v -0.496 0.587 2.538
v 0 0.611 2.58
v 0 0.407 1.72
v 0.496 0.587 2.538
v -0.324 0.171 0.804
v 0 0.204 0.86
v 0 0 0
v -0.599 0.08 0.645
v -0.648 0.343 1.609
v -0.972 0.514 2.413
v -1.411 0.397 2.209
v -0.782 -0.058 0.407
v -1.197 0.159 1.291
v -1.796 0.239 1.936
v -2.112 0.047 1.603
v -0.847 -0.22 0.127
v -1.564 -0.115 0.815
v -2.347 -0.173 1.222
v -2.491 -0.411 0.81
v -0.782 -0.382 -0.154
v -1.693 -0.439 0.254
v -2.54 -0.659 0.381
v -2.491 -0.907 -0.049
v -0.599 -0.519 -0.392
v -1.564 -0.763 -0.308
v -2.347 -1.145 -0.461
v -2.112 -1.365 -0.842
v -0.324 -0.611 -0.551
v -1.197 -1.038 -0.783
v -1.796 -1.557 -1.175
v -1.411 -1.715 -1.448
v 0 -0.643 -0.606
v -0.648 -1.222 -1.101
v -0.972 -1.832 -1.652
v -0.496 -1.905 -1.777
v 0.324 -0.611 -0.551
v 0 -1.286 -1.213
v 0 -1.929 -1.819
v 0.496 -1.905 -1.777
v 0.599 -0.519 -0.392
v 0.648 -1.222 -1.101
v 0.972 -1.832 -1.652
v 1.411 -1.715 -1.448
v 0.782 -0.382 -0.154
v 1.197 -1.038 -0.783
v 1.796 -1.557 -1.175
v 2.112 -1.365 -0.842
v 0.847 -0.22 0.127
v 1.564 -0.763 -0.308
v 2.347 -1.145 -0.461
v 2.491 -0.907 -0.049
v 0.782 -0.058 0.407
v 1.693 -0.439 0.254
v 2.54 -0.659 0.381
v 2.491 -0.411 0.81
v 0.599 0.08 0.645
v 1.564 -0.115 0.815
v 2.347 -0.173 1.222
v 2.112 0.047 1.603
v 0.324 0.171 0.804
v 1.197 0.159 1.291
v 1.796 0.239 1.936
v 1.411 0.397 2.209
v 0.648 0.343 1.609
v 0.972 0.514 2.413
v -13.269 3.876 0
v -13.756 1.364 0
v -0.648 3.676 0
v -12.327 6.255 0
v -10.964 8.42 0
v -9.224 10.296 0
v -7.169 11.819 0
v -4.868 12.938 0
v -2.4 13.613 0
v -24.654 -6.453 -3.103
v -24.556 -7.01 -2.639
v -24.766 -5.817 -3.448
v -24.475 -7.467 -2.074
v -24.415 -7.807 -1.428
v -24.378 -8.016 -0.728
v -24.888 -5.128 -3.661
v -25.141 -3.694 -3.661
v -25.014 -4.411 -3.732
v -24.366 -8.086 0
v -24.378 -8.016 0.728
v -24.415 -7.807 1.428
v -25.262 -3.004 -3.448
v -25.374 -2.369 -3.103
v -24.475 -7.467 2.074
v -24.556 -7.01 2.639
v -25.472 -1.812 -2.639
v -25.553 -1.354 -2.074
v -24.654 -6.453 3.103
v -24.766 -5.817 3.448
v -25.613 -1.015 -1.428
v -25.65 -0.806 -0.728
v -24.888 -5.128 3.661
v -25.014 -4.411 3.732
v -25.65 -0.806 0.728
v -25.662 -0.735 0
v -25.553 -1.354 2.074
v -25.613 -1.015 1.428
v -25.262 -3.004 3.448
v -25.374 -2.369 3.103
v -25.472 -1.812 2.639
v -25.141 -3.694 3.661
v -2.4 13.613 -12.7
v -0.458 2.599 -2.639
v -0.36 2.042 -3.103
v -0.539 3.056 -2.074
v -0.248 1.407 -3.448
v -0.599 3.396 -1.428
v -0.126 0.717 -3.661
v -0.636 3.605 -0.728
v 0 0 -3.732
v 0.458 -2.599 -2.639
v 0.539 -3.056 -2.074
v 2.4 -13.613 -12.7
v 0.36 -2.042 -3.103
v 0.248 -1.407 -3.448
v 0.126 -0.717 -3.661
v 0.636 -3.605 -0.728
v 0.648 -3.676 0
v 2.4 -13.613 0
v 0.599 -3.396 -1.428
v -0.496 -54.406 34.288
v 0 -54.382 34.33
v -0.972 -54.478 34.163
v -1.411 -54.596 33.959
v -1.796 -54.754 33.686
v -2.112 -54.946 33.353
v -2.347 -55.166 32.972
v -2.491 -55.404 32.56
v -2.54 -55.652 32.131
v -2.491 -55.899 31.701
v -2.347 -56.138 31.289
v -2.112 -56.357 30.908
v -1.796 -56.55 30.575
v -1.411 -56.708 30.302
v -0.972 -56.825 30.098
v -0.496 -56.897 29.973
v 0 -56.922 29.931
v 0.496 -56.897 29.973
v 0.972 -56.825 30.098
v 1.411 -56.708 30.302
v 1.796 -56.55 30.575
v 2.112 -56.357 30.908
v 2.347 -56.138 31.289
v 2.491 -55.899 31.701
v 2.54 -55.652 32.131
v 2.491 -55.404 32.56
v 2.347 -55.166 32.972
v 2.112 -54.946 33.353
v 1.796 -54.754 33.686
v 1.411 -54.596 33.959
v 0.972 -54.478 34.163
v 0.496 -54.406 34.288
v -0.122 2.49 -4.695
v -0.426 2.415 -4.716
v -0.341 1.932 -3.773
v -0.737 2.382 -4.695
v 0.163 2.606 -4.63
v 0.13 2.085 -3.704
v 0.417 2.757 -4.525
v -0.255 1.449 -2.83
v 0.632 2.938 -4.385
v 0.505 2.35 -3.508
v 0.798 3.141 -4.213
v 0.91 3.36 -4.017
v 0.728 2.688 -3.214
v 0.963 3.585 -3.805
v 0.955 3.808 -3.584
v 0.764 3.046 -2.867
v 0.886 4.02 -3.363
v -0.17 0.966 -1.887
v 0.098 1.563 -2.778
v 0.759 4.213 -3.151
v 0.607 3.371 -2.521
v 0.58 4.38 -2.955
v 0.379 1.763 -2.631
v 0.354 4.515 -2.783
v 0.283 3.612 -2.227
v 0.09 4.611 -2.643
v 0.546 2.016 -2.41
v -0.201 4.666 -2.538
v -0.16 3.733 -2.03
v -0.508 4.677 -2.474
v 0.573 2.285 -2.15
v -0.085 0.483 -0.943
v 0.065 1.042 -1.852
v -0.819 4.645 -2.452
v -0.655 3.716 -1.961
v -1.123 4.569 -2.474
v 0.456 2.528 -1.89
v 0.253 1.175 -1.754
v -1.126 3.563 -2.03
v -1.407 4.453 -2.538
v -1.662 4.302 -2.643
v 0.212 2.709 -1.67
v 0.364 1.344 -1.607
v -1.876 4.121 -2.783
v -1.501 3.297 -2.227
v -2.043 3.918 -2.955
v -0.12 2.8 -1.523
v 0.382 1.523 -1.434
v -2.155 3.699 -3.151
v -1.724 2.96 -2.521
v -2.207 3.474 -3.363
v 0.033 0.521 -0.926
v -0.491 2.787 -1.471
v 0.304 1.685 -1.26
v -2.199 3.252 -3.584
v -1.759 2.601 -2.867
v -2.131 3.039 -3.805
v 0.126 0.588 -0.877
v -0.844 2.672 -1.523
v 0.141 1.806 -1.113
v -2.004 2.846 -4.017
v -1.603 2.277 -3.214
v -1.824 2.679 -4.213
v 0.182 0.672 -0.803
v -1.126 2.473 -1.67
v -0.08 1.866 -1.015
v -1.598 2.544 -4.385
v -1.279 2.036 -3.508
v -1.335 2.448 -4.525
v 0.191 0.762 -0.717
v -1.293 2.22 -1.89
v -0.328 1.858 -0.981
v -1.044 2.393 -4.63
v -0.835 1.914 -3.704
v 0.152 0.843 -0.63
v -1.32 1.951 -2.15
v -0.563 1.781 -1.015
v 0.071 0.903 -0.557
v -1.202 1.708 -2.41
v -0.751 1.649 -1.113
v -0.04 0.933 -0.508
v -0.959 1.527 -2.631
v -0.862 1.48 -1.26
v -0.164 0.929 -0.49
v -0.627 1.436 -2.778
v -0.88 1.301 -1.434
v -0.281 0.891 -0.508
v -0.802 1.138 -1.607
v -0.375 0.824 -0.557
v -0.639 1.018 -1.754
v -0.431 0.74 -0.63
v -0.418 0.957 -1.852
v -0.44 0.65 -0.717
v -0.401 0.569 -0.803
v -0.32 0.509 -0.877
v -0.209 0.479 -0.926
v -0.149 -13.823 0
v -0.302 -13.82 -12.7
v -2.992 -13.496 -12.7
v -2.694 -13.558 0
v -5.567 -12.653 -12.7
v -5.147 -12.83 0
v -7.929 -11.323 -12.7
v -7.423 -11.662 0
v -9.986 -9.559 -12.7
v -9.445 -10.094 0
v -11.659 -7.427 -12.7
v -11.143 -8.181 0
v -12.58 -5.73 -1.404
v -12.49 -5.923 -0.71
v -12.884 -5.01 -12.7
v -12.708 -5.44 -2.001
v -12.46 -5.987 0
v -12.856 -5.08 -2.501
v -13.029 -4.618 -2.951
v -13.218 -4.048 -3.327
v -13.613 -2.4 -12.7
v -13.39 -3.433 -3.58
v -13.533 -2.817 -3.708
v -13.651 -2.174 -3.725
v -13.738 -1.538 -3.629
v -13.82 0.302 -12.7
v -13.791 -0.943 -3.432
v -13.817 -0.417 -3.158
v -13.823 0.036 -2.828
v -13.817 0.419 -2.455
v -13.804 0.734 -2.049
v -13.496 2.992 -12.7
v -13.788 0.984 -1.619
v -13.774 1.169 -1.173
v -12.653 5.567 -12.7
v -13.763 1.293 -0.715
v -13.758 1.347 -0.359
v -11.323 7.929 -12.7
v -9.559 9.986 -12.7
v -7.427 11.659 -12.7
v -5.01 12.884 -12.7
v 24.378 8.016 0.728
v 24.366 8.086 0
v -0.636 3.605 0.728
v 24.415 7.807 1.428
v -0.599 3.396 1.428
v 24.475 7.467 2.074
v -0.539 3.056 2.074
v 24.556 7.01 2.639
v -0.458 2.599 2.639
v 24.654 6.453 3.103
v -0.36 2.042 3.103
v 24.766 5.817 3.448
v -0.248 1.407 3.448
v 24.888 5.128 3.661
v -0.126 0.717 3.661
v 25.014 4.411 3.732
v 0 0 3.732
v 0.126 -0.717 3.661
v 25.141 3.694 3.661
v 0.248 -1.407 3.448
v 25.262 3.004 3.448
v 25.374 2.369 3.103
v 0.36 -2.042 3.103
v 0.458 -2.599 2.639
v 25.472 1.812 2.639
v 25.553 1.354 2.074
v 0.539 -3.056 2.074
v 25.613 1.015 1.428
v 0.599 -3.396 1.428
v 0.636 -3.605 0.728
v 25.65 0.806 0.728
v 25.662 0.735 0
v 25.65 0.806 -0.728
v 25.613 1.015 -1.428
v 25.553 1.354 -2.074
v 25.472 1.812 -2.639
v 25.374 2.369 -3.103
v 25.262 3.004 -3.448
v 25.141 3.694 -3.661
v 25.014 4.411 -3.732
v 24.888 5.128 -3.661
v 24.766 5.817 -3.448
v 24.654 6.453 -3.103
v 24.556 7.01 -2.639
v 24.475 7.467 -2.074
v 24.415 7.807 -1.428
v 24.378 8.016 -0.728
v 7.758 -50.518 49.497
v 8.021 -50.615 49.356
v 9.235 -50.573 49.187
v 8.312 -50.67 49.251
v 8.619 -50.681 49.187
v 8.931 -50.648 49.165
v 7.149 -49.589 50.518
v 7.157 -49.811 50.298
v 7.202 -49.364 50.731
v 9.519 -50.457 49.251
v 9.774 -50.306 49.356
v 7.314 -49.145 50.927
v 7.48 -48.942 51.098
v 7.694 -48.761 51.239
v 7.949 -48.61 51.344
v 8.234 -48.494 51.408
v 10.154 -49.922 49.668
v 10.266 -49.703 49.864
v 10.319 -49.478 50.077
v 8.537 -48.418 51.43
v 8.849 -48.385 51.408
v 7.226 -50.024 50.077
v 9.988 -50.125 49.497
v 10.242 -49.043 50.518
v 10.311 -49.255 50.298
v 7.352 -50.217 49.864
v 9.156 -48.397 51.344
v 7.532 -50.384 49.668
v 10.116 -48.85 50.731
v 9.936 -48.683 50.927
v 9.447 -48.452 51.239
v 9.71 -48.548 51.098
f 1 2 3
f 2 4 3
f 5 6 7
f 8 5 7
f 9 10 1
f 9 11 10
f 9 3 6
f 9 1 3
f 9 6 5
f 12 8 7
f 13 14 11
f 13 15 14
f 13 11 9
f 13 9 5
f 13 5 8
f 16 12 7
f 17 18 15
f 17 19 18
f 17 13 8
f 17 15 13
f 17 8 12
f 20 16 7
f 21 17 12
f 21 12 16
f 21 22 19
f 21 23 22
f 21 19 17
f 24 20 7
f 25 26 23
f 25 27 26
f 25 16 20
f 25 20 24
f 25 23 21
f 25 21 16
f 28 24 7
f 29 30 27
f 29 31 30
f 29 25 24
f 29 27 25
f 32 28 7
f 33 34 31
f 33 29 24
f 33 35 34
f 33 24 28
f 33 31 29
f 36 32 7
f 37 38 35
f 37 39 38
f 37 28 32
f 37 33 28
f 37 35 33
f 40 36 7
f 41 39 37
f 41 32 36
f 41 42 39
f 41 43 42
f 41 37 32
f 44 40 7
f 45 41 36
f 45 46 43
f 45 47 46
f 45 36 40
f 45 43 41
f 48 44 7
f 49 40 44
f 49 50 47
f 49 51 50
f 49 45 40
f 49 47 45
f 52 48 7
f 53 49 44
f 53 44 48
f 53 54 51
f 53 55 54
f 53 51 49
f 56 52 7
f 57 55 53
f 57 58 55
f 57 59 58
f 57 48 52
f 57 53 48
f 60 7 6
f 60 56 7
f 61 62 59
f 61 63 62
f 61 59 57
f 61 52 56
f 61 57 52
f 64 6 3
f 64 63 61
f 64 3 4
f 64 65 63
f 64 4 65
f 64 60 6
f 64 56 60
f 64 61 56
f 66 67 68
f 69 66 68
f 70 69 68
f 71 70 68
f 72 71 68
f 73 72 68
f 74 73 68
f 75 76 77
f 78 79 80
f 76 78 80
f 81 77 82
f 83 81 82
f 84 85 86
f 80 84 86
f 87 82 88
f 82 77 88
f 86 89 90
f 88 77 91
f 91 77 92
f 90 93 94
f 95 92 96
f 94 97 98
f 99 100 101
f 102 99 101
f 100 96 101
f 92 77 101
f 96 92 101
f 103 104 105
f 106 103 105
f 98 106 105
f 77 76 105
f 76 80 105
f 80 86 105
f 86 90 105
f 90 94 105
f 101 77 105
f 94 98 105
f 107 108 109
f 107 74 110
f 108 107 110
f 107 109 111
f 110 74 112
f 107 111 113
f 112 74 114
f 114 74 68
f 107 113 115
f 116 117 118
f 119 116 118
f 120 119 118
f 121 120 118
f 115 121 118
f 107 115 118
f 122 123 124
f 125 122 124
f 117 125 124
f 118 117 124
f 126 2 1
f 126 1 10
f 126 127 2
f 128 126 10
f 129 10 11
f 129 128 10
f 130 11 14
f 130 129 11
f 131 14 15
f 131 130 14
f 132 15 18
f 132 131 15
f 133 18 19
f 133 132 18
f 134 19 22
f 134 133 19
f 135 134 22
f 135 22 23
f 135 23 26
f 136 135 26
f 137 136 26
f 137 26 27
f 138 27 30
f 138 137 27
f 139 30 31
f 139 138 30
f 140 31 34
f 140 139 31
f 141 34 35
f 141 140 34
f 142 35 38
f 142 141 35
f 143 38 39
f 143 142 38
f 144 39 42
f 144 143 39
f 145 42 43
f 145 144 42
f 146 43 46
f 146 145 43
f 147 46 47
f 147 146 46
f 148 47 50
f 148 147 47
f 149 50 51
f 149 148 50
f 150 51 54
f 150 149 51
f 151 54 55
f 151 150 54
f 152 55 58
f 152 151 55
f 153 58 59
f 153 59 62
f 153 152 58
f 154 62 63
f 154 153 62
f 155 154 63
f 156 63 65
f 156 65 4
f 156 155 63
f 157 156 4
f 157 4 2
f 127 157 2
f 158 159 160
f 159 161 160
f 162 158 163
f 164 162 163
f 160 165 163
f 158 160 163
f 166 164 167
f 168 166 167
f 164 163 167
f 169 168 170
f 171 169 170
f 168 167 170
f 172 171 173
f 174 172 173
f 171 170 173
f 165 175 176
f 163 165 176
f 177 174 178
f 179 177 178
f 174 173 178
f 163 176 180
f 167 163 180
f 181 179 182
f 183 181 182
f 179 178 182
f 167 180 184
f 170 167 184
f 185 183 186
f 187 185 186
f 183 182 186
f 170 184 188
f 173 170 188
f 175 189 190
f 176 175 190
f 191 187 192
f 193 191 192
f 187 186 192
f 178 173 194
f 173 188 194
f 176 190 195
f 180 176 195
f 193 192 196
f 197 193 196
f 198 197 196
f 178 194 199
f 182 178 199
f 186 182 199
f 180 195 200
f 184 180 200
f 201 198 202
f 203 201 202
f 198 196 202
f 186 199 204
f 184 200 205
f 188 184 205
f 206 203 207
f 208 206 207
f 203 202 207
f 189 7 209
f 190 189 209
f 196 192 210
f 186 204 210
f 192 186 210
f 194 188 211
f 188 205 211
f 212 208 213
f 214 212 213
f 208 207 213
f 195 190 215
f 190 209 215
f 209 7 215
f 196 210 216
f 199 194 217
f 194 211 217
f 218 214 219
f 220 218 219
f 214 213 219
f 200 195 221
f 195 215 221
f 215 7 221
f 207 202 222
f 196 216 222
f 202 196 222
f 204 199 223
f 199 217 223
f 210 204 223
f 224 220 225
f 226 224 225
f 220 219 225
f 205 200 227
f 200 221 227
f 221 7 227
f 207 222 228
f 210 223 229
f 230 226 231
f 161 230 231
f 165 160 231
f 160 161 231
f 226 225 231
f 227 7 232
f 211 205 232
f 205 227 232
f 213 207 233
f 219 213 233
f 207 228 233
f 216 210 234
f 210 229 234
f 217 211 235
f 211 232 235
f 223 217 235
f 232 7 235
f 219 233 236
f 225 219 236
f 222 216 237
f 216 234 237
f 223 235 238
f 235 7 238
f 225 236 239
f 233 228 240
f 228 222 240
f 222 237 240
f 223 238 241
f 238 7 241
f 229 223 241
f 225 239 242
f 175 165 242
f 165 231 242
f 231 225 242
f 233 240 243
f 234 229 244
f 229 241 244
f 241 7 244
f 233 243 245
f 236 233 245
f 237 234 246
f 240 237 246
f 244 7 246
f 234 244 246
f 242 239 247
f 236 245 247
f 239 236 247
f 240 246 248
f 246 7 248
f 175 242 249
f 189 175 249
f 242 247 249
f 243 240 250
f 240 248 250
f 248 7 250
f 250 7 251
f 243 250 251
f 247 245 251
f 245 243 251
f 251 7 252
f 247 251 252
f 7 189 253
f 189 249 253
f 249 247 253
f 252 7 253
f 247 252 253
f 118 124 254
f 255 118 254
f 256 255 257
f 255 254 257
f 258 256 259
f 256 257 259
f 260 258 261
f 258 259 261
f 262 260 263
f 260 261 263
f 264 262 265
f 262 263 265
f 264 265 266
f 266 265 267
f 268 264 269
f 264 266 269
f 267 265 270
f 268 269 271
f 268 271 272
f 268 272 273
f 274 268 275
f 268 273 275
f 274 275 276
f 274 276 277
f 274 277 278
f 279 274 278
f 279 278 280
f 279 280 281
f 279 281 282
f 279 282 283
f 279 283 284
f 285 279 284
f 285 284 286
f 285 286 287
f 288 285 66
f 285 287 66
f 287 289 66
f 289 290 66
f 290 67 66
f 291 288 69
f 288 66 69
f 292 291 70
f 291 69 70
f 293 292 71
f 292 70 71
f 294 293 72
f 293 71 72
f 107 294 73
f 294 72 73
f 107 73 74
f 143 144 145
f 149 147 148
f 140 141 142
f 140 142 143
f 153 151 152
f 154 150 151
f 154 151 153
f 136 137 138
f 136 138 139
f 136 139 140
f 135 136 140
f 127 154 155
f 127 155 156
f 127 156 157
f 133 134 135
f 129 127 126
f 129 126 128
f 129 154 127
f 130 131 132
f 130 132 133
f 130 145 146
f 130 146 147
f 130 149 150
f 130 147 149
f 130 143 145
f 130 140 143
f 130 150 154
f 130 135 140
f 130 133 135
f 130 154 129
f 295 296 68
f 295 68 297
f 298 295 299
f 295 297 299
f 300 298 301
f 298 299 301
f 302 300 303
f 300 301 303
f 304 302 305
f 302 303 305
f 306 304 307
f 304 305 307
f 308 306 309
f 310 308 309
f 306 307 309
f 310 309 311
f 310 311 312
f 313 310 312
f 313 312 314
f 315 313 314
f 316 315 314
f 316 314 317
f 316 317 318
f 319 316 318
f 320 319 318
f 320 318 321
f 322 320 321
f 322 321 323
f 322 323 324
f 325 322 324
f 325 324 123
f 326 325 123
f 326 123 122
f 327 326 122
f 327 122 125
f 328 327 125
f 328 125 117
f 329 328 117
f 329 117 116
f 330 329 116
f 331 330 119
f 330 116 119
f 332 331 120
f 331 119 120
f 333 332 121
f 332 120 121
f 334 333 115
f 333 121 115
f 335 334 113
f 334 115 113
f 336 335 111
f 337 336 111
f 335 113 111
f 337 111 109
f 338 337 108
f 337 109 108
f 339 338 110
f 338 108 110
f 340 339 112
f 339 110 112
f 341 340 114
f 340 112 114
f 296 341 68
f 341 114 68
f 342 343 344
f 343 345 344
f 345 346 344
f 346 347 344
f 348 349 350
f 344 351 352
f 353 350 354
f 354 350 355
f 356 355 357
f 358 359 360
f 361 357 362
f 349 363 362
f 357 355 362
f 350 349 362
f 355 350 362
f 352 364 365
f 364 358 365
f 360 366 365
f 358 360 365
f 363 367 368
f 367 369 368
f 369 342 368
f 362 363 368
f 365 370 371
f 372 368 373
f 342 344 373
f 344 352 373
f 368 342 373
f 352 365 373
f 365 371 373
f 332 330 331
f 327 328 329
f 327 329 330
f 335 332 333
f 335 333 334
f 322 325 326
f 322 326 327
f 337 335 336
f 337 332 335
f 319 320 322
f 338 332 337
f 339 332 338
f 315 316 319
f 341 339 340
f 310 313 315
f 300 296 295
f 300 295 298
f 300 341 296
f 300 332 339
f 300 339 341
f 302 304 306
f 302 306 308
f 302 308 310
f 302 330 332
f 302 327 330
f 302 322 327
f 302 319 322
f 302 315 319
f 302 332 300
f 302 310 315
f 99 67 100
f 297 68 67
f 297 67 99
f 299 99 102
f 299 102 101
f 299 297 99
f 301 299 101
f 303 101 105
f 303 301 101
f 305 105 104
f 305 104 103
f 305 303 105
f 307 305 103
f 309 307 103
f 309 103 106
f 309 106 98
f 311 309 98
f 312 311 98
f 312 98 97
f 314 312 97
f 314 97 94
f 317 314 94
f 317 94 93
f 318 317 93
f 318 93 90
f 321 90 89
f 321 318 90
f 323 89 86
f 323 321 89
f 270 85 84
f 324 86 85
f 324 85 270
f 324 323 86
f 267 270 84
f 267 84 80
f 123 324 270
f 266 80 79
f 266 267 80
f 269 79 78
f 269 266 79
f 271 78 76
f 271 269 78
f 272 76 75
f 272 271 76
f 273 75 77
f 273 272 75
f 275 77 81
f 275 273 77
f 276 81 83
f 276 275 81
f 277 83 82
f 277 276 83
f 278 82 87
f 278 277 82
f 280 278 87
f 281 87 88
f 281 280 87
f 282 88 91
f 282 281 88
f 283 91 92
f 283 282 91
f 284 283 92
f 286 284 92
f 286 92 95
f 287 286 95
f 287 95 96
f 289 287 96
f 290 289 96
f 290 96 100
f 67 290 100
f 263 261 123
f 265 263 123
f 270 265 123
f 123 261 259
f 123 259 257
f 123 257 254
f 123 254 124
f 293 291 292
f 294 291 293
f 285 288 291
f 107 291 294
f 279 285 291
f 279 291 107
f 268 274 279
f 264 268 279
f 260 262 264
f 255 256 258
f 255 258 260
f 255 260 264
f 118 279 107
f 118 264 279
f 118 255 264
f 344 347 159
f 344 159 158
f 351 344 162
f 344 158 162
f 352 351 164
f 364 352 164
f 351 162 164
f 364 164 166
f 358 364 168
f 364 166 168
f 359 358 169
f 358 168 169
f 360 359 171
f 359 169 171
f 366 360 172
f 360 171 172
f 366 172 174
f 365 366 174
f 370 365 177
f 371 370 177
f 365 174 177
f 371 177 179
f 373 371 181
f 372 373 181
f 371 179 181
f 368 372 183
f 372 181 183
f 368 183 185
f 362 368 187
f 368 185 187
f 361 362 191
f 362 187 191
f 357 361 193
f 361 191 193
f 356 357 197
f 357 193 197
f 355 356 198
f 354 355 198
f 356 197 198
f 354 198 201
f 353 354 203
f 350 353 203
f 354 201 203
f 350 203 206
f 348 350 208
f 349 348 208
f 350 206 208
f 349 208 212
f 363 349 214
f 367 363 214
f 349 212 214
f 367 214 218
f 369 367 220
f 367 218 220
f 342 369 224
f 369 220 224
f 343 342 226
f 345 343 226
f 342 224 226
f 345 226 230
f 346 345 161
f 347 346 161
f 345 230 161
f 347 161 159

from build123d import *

# Parameters (mm, degrees)
F5_DEPTH      = 12.7
F8_R          = 3.7324399965
F9_DEPTH      = 25.4
F9_DEPTH_BACK = 25.4


with BuildPart() as f3:
    # F0 (on Right) → F3 (revolve)
    with BuildSketch(Plane.YZ):
        Polygon((-54.3816796127, 34.3302167309), (-55.6516796127, 32.1305122053), (0, 0), (0.6109335276, 2.5802167309), align=None)
    revolve(axis=Axis((0, -33.598147265, 19.3978993677), (0, -0.8660254038, 0.5)))


with BuildPart() as f5:
    # F4 (on line) → F5 (new body)
    with BuildSketch(Plane(origin=(0, 0, 0), x_dir=(1, 0, 0), z_dir=(0, 0, -1))):
        with BuildLine():
            Line((0, 0), (2.4004124433, 13.6134154491))
            ThreePointArc((2.4004124433, 13.6134154491), (-13.6134154491, 2.4004124433), (-2.4004124433, -13.6134154491))
            Line((-2.4004124433, -13.6134154491), (0, 0))
        make_face()
    extrude(amount=F5_DEPTH)

    # F8 (on face) → F9 (join, two sides)
    with BuildSketch(Plane(origin=(0, 0, 0), x_dir=(-0.1736481777, 0.984807753, 0), z_dir=(0.984807753, 0.1736481777, 0))) as f9_sk:
        Circle(F8_R)
    extrude(amount=F9_DEPTH)
    extrude(f9_sk.sketch, amount=-F9_DEPTH_BACK)


with BuildPart() as f7:
    # F6 (on face) → F7 (revolve)
    with BuildSketch(Plane(origin=(0, 0, 0), x_dir=(-0.1736481777, 0.984807753, 0), z_dir=(0.984807753, 0.1736481777, 0))):
        Polygon((2.4517506192, -4.7163042091), (0, 0), (-50.2975093123, 50.2975093123), (-51.4297861072, 49.1652325173), align=None)
    revolve(axis=Axis((5.3802521718, -30.5129263268, 30.9836373987), (0.122787804, -0.6963642403, 0.7071067812)))


solid = Compound([f3.part, f5.part, f7.part])
